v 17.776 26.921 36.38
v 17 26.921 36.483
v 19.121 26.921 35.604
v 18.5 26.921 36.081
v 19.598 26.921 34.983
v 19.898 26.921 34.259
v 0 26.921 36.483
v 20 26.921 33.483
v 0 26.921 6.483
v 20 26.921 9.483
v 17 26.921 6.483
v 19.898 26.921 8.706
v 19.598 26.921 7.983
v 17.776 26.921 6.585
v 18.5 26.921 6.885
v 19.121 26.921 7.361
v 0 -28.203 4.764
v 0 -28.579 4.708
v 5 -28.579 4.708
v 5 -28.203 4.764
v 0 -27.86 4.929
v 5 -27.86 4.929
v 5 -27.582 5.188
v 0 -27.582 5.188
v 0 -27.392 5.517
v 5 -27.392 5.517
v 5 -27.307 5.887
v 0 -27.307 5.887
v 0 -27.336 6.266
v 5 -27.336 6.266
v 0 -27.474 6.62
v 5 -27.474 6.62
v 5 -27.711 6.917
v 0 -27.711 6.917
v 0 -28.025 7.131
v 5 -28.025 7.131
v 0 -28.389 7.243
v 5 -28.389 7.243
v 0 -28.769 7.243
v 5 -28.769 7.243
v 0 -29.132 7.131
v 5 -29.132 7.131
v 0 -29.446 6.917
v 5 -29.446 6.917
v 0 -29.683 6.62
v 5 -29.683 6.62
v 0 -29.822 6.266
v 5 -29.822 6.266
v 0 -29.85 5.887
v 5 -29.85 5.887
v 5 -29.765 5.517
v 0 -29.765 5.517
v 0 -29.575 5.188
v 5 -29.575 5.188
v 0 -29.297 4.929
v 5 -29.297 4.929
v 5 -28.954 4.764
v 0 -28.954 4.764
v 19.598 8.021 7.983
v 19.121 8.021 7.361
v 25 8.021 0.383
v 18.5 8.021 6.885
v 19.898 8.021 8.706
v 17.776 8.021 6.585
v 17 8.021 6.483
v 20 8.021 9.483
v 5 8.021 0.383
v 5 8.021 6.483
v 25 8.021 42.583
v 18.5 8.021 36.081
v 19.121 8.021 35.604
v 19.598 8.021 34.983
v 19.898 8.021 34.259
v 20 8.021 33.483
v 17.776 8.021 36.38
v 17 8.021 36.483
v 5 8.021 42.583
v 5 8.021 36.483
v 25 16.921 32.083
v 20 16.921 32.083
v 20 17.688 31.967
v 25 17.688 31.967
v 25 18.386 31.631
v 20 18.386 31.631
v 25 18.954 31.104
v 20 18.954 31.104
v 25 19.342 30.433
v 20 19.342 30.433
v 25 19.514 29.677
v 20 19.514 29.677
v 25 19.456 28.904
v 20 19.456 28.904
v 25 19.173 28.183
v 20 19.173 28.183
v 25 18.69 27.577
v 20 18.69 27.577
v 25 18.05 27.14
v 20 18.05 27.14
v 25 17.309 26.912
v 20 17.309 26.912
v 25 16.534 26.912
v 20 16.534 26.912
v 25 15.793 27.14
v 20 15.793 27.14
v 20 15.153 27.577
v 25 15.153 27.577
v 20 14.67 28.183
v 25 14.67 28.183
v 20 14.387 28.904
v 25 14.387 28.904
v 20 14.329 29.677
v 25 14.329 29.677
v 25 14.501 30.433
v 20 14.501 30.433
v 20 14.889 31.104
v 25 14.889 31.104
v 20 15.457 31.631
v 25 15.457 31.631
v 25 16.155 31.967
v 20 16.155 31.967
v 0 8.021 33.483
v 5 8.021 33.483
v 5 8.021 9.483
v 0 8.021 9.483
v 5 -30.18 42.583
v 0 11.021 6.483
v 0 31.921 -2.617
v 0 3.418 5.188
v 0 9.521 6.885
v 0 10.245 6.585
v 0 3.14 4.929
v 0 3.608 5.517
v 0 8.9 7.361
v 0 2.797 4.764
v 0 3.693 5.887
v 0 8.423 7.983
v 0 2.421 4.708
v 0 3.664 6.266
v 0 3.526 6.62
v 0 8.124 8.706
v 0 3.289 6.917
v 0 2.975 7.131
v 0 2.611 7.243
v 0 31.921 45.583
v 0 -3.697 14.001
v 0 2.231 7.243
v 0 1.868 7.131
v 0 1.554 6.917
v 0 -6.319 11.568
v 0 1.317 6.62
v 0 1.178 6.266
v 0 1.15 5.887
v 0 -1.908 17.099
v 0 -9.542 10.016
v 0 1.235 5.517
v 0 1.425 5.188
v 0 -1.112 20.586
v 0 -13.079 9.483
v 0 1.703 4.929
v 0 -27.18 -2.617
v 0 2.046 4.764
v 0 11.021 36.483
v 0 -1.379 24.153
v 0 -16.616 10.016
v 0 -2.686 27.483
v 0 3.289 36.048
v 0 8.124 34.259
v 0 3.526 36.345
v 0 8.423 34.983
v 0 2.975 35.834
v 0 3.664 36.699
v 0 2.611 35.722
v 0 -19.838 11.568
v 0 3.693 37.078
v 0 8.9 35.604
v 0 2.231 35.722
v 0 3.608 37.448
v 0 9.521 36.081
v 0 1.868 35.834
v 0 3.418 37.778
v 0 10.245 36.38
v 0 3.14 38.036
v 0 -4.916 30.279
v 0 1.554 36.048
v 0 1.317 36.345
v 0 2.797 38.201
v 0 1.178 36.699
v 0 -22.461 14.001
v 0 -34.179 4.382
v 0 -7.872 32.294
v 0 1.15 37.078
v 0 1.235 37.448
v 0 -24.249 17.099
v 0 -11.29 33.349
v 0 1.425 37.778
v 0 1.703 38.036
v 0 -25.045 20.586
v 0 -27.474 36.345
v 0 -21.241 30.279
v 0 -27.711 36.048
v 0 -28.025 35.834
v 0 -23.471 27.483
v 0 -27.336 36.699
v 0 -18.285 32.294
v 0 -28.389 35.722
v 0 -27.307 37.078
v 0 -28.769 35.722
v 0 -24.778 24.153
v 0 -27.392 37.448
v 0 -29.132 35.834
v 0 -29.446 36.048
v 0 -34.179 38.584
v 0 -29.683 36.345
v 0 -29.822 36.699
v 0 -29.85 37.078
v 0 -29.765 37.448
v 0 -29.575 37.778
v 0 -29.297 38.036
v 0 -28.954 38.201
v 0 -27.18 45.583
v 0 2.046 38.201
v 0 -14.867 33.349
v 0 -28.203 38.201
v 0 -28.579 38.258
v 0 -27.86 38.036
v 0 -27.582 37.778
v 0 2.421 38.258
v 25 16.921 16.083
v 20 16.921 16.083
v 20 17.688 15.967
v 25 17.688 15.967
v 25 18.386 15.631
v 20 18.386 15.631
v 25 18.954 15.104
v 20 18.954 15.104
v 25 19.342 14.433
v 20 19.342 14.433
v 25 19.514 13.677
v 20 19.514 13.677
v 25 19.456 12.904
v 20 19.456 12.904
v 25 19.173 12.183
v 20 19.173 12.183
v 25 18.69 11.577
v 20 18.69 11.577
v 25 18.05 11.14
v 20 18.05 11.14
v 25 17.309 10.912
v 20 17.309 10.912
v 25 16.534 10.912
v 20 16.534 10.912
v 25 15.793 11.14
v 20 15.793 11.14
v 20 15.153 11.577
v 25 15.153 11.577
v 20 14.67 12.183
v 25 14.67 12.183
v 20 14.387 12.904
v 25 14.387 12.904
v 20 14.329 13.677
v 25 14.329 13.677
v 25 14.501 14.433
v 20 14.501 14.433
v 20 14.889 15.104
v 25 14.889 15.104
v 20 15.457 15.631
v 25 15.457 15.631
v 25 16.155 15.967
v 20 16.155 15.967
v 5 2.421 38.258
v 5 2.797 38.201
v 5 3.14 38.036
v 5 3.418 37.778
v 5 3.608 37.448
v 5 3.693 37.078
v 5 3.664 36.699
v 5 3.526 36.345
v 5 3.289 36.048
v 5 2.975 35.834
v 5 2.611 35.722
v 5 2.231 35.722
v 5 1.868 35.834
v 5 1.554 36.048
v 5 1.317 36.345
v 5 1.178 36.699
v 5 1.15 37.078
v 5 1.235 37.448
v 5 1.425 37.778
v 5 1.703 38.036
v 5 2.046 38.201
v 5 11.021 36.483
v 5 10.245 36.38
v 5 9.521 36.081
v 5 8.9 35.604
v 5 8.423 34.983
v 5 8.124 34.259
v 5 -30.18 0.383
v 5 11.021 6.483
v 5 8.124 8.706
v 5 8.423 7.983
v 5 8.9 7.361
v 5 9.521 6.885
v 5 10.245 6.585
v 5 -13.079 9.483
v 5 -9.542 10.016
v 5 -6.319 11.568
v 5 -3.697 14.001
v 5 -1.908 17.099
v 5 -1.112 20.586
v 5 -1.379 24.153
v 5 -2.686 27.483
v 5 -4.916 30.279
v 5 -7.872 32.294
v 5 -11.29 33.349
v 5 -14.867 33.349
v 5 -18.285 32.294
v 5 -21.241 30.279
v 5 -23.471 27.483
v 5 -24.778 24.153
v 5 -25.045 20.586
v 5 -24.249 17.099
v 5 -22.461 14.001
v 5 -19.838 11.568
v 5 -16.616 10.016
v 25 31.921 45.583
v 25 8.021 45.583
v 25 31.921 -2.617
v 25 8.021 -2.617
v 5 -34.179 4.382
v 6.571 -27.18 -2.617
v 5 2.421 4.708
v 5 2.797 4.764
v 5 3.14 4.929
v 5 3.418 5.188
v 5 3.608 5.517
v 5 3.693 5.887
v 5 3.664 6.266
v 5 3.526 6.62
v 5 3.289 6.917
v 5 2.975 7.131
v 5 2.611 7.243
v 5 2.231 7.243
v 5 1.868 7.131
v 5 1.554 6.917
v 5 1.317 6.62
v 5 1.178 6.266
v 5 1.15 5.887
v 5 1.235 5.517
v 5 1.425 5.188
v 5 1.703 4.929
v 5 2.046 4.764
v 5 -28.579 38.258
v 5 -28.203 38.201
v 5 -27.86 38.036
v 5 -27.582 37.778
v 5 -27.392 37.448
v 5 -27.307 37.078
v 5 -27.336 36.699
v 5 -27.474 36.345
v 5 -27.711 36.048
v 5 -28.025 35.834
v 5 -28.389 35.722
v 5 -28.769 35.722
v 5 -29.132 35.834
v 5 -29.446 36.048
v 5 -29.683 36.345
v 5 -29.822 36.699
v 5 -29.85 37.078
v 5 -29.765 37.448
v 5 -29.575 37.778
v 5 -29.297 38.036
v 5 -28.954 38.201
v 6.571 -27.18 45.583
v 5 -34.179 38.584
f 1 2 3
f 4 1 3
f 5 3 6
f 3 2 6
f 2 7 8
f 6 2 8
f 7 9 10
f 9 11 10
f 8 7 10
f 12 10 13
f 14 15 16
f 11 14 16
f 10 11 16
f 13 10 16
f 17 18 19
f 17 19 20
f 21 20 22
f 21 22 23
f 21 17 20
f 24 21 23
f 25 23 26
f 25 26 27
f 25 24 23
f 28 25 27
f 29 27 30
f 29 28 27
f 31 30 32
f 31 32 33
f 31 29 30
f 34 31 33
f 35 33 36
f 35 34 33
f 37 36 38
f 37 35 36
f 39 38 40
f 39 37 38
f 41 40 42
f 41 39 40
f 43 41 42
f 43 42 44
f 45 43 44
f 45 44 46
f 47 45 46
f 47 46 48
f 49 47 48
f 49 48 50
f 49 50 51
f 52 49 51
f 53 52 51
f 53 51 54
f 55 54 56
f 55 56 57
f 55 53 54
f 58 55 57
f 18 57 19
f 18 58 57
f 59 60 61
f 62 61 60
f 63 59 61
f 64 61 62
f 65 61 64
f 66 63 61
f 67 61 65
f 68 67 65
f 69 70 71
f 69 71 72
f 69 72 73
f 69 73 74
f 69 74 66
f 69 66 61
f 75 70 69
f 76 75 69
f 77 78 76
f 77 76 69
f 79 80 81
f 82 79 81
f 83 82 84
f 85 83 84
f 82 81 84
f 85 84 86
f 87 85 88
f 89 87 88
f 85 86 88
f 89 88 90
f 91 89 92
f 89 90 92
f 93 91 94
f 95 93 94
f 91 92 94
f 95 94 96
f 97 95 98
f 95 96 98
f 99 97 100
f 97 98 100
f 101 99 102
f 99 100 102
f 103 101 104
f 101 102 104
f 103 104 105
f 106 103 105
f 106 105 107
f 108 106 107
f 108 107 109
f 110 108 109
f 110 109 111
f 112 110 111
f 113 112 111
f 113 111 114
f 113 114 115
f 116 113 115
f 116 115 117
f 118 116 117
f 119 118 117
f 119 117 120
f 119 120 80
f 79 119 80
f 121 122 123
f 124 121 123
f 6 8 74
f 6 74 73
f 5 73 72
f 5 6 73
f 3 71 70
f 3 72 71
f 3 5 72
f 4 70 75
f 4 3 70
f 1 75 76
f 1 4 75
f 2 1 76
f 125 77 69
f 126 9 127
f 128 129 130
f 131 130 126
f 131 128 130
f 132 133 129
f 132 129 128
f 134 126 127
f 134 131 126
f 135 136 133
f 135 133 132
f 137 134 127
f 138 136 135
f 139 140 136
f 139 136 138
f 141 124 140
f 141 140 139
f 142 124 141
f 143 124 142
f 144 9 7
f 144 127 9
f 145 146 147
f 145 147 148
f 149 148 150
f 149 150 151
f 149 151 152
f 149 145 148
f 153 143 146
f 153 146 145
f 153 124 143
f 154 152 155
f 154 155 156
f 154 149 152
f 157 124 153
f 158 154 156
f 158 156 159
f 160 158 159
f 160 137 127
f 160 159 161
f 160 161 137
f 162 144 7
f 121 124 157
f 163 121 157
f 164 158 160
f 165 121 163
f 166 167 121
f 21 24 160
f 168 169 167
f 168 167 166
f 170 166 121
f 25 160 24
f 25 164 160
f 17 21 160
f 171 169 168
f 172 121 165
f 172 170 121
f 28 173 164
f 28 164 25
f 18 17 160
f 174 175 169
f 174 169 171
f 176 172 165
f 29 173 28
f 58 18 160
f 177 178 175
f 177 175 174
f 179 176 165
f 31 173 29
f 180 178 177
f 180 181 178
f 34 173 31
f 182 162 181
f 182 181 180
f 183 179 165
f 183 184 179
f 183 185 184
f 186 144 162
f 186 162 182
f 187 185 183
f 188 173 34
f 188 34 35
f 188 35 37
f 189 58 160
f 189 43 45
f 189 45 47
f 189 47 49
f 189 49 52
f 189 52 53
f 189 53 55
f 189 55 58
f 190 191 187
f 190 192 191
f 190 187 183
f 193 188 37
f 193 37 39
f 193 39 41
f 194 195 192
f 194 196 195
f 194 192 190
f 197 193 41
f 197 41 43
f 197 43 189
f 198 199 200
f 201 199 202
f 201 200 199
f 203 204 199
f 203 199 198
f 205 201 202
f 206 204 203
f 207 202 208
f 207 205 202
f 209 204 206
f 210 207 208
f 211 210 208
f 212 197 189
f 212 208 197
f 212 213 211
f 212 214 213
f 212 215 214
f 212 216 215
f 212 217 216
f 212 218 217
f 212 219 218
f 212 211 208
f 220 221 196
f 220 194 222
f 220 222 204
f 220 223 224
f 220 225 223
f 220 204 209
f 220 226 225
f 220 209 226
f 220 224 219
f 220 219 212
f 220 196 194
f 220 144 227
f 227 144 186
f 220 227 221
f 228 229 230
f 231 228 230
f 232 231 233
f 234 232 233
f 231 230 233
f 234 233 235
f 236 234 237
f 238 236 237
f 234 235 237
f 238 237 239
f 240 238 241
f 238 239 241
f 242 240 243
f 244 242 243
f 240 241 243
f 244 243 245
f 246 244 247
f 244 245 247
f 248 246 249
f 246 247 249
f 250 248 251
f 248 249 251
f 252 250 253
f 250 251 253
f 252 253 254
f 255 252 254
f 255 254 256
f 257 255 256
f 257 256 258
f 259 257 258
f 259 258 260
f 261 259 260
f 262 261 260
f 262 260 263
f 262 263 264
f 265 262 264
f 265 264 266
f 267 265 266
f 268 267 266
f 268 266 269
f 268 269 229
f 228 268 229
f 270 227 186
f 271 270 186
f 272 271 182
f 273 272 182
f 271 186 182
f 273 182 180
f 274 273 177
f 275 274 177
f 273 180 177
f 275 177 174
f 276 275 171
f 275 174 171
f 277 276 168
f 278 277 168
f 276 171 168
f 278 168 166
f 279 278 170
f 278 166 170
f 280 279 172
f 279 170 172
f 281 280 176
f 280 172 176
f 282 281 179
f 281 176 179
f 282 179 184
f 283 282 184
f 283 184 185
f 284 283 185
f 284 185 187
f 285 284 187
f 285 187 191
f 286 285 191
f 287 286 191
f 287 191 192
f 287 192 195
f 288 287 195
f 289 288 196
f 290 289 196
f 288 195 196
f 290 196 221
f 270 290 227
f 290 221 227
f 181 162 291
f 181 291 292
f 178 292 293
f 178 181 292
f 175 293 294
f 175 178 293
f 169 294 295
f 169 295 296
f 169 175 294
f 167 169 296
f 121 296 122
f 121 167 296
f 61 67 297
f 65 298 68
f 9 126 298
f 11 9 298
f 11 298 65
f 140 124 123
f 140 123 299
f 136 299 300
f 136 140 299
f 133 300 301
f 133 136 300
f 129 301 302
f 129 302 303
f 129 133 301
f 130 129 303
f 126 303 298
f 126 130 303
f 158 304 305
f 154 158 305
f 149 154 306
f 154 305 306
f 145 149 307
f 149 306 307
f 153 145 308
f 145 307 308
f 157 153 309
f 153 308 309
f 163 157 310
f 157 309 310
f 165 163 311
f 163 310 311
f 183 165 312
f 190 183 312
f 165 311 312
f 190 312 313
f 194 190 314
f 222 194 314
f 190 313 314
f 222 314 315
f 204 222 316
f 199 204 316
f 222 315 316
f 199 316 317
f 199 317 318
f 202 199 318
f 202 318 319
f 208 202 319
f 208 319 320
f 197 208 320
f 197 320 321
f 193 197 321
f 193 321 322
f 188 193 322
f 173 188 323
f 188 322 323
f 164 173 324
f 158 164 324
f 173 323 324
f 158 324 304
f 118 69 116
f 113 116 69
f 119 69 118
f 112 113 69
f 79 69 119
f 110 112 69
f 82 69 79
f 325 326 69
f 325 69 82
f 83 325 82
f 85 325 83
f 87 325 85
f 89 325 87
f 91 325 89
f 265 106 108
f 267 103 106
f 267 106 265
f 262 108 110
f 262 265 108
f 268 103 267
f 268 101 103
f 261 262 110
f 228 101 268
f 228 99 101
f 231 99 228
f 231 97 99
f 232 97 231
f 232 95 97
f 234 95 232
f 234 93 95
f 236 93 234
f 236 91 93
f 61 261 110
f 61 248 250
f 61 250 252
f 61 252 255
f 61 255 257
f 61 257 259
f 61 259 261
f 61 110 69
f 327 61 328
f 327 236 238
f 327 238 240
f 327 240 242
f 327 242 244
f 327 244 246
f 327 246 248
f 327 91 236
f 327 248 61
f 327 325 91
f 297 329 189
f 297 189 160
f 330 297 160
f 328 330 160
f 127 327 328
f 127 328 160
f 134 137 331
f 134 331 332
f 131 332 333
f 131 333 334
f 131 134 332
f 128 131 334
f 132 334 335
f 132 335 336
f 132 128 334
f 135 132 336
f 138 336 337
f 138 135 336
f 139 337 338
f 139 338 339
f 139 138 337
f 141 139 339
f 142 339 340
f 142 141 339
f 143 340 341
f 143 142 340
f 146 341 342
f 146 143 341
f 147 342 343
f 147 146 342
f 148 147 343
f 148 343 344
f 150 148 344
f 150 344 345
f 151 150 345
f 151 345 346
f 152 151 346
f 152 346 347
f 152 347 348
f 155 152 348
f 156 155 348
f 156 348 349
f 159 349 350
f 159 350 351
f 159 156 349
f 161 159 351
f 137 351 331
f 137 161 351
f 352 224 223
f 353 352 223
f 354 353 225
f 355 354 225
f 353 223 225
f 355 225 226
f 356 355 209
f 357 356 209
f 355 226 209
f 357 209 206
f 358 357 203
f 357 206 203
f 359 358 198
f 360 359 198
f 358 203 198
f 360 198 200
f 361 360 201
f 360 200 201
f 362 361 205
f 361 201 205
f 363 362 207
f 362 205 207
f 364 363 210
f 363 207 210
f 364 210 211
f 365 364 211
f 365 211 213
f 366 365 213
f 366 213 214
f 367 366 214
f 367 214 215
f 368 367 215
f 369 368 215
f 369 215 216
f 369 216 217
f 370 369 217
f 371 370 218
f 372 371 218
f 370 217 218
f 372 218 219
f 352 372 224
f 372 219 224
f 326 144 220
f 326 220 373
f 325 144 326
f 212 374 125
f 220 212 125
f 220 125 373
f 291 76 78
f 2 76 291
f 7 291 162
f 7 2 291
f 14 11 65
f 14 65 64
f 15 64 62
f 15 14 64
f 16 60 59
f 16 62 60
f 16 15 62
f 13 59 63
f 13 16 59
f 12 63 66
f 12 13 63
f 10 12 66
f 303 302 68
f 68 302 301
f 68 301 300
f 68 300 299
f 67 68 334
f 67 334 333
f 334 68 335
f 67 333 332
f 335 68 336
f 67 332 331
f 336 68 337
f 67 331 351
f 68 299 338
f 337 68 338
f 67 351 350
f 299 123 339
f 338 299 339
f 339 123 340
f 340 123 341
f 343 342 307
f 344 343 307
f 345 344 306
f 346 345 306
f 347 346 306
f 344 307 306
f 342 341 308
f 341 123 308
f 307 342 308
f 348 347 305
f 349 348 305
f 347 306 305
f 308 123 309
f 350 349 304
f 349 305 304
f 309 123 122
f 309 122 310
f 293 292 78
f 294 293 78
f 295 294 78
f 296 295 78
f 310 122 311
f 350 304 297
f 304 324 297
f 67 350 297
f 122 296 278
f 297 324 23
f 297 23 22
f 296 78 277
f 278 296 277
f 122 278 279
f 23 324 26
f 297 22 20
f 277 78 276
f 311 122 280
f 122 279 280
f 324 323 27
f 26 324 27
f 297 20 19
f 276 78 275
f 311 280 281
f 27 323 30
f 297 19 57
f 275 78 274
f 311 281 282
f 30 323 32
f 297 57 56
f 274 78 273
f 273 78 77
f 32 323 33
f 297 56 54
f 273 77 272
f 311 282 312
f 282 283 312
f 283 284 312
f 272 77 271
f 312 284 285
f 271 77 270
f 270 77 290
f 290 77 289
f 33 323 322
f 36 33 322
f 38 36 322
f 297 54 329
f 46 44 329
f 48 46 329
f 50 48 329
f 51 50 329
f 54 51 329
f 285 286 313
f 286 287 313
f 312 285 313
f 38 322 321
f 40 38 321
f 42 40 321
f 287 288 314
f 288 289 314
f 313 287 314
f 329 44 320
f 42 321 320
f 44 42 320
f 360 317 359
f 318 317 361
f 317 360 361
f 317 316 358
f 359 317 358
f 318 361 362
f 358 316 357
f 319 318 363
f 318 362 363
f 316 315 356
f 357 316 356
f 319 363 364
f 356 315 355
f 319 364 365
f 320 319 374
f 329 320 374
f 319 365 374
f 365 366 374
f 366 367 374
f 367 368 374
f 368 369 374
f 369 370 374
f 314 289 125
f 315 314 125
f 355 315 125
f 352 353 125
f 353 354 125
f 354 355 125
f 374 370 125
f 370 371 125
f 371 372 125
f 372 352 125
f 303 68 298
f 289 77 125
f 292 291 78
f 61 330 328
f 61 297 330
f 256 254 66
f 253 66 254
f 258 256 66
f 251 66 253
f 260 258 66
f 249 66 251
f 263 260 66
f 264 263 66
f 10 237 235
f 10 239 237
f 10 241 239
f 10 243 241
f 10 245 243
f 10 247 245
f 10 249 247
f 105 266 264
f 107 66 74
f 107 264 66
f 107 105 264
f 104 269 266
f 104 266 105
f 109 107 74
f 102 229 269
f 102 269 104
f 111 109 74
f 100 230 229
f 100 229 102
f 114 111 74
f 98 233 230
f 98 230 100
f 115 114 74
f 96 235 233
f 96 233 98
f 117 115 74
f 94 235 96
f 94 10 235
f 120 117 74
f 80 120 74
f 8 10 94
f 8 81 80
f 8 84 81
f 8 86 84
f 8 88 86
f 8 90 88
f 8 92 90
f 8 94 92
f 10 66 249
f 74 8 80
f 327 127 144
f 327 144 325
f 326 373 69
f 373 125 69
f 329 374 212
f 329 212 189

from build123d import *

# Parameters (mm, degrees)
SKETCH1_R           = 1.275
BOSS_EXTRUDE1_DEPTH = 5
SKETCH2_W           = 9.1
SKETCH2_H           = 17.8
BOSS_EXTRUDE2_DEPTH = 20
BOSS_EXTRUDE3_DEPTH = 3
CUT_EXTRUDE1_DEPTH  = 15
SKETCH7_W           = 24.2
SKETCH7_H           = 42.2
BOSS_EXTRUDE4_DEPTH = 5
SKETCH8_R           = 12
CUT_EXTRUDE3_DEPTH  = 5
SKETCH10_W          = 48.2
SKETCH10_H          = 17.8
BOSS_EXTRUDE5_DEPTH = 5
FILLET1_R           = 3
BOSS_EXTRUDE6_START = 6.1
BOSS_EXTRUDE6_DEPTH = 6.1
SKETCH13_R          = 2.6
CUT_EXTRUDE4_DEPTH  = 16
FILLET2_R           = 3
SKETCH14_W          = 25
SKETCH14_H          = 48.2
BOSS_EXTRUDE7_DEPTH = 5


with BuildPart() as part:
    # Sketch1 → Boss-Extrude1 (new body)
    # profile 1 of 2: a face of its own
    with BuildSketch(Plane(origin=(0, 0, 0), x_dir=(0, 0, -1), z_dir=(1, 0, 0))):
        Polygon((-4.381647728, -34.17856484), (-0.382647728, -30.17956484), (-0.382647728, 8.02143516), (-6.482647728, 8.02143516), (-9.382647728, 8.02143516), (-9.382647728, -34.17856484), align=None)
        with Locations((-5.982647728, 2.42143516)):
            Circle(SKETCH1_R, mode=Mode.SUBTRACT)
        with Locations((-5.982647728, -28.57856484)):
            Circle(SKETCH1_R, mode=Mode.SUBTRACT)
    # profile 2 of 2: a face of its own
    with BuildSketch(Plane(origin=(0, 0, 0), x_dir=(0, 0, -1), z_dir=(1, 0, 0))):
        Polygon((2.617352272, 8.02143516), (2.617352272, 25.82143516), (-6.482647728, 25.82143516), (-6.482647728, 8.02143516), (-0.382647728, 8.02143516), align=None)
    extrude(amount=BOSS_EXTRUDE1_DEPTH)

    # Sketch2 → Boss-Extrude2 (add)
    with BuildSketch(Plane(origin=(5, 0, 0), x_dir=(0, 0, -1), z_dir=(1, 0, 0))):
        with Locations((-1.932647728, 16.92143516)):
            Rectangle(SKETCH2_W, SKETCH2_H)
    extrude(amount=BOSS_EXTRUDE2_DEPTH)

    # Sketch3 → Boss-Extrude3 (add)
    with BuildSketch(Plane(origin=(0, 0, 0.382647728), x_dir=(-1, 0, 0), z_dir=(0, 0, -1))):
        Polygon((-25, 8.02143516), (0, 8.02143516), (0, -30.17956484), (-5, -30.17956484), align=None)
    extrude(amount=BOSS_EXTRUDE3_DEPTH)

    # Sketch4 → Cut-Extrude1 (cut, symmetric)
    with BuildSketch(Plane(origin=(5, 0, 0), x_dir=(0, 0, -1), z_dir=(1, 0, 0))):
        Polygon((-0.382647728, -30.17956484), (2.617352272, -27.17956484), (2.617352272, -30.17956484), align=None)
    extrude(amount=CUT_EXTRUDE1_DEPTH, both=True, mode=Mode.SUBTRACT)


with BuildPart() as body_2:
    # Mirror14: mirrored copy
    add(part.part.mirror(Plane.XY.offset(21.482647728)))


with BuildPart() as part_1:
    add(part.part)

    add(body_2.part)  # Boss-Extrude4 merges body 2
    # Sketch7 → Boss-Extrude4 (add)
    with BuildSketch(Plane(origin=(5, 0, 0), x_dir=(0, 0, -1), z_dir=(1, 0, 0))):
        with Locations((-21.482647728, -13.07856484)):
            Rectangle(SKETCH7_W, SKETCH7_H)
    extrude(amount=-BOSS_EXTRUDE4_DEPTH)

    # Sketch8 → Cut-Extrude3 (cut)
    with BuildSketch(Plane(origin=(5, 0, 0), x_dir=(0, 0, -1), z_dir=(1, 0, 0))):
        with Locations((-21.482647728, -13.07856484)):
            Circle(SKETCH8_R)
    extrude(amount=-CUT_EXTRUDE3_DEPTH, mode=Mode.SUBTRACT)

    # Sketch10 → Boss-Extrude5 (add)
    with BuildSketch(Plane(origin=(25, 0, 0), x_dir=(0, 0, -1), z_dir=(1, 0, 0))):
        with Locations((-21.482647728, 16.92143516)):
            Rectangle(SKETCH10_W, SKETCH10_H)
    extrude(amount=-BOSS_EXTRUDE5_DEPTH)

    # Fillet1
    fillet1_edges = [part_1.edges().sort_by_distance(p)[0] for p in [
        (20, 16.92143516, 36.482647728),
        (20, 16.92143516, 6.482647728),
    ]]
    fillet(fillet1_edges, radius=FILLET1_R)

    # Sketch12 → Boss-Extrude6 (add)
    with BuildSketch(Plane(origin=(0, 25.82143516, 0), x_dir=(1, 0, 0), z_dir=(0, 1, 0)).offset(BOSS_EXTRUDE6_START)):
        with BuildLine():
            Line((25, 2.617352272), (0, 2.617352272))
            Line((0, 2.617352272), (0, -6.482647728))
            Line((0, -6.482647728), (17, -6.482647728))
            ThreePointArc((17, -6.482647728), (19.121320344, -7.361327384), (20, -9.482647728))
            Line((20, -9.482647728), (20, -33.482647728))
            ThreePointArc((20, -33.482647728), (19.121320344, -35.603968072), (17, -36.482647728))
            Line((17, -36.482647728), (0, -36.482647728))
            Line((0, -36.482647728), (0, -45.582647728))
            Line((0, -45.582647728), (25, -45.582647728))
            Line((25, -45.582647728), (25, 2.617352272))
        make_face()
    extrude(amount=-BOSS_EXTRUDE6_DEPTH)

    # Sketch13 → Cut-Extrude4 (cut)
    with BuildSketch(Plane.ZY.offset(-20)):
        with Locations((29.482647728, 16.92143516)):
            Circle(SKETCH13_R)
        with Locations((13.482647728, 16.92143516)):
            Circle(SKETCH13_R)
    extrude(amount=-CUT_EXTRUDE4_DEPTH, mode=Mode.SUBTRACT)

    # Fillet2
    # the kernel refuses this fillet: 3 mm, written as the material it adds along each edge
    with BuildSketch(Plane(origin=(0, 8.02143516, 6.482647728), x_dir=(0, 1, 0), z_dir=(1, 0, 0)), Plane(origin=(0, 8.02143516, 36.482647728), x_dir=(0, 0, -1), z_dir=(1, 0, 0))) as fillet2_piece_1:
        with BuildLine():
            CenterArc((FILLET2_R, FILLET2_R), FILLET2_R, 180, 90)
            Line((0, FILLET2_R), (0, 0))
            Line((0, 0), (FILLET2_R, 0))
        make_face()
    extrude(amount=5)

    # Sketch14 → Boss-Extrude7 (add)
    with BuildSketch(Plane(origin=(0, 31.92143516, 0), x_dir=(1, 0, 0), z_dir=(0, 1, 0))):
        with Locations((12.5, -21.482647728)):
            Rectangle(SKETCH14_W, SKETCH14_H)
    extrude(amount=-BOSS_EXTRUDE7_DEPTH)


solid = part_1.part
